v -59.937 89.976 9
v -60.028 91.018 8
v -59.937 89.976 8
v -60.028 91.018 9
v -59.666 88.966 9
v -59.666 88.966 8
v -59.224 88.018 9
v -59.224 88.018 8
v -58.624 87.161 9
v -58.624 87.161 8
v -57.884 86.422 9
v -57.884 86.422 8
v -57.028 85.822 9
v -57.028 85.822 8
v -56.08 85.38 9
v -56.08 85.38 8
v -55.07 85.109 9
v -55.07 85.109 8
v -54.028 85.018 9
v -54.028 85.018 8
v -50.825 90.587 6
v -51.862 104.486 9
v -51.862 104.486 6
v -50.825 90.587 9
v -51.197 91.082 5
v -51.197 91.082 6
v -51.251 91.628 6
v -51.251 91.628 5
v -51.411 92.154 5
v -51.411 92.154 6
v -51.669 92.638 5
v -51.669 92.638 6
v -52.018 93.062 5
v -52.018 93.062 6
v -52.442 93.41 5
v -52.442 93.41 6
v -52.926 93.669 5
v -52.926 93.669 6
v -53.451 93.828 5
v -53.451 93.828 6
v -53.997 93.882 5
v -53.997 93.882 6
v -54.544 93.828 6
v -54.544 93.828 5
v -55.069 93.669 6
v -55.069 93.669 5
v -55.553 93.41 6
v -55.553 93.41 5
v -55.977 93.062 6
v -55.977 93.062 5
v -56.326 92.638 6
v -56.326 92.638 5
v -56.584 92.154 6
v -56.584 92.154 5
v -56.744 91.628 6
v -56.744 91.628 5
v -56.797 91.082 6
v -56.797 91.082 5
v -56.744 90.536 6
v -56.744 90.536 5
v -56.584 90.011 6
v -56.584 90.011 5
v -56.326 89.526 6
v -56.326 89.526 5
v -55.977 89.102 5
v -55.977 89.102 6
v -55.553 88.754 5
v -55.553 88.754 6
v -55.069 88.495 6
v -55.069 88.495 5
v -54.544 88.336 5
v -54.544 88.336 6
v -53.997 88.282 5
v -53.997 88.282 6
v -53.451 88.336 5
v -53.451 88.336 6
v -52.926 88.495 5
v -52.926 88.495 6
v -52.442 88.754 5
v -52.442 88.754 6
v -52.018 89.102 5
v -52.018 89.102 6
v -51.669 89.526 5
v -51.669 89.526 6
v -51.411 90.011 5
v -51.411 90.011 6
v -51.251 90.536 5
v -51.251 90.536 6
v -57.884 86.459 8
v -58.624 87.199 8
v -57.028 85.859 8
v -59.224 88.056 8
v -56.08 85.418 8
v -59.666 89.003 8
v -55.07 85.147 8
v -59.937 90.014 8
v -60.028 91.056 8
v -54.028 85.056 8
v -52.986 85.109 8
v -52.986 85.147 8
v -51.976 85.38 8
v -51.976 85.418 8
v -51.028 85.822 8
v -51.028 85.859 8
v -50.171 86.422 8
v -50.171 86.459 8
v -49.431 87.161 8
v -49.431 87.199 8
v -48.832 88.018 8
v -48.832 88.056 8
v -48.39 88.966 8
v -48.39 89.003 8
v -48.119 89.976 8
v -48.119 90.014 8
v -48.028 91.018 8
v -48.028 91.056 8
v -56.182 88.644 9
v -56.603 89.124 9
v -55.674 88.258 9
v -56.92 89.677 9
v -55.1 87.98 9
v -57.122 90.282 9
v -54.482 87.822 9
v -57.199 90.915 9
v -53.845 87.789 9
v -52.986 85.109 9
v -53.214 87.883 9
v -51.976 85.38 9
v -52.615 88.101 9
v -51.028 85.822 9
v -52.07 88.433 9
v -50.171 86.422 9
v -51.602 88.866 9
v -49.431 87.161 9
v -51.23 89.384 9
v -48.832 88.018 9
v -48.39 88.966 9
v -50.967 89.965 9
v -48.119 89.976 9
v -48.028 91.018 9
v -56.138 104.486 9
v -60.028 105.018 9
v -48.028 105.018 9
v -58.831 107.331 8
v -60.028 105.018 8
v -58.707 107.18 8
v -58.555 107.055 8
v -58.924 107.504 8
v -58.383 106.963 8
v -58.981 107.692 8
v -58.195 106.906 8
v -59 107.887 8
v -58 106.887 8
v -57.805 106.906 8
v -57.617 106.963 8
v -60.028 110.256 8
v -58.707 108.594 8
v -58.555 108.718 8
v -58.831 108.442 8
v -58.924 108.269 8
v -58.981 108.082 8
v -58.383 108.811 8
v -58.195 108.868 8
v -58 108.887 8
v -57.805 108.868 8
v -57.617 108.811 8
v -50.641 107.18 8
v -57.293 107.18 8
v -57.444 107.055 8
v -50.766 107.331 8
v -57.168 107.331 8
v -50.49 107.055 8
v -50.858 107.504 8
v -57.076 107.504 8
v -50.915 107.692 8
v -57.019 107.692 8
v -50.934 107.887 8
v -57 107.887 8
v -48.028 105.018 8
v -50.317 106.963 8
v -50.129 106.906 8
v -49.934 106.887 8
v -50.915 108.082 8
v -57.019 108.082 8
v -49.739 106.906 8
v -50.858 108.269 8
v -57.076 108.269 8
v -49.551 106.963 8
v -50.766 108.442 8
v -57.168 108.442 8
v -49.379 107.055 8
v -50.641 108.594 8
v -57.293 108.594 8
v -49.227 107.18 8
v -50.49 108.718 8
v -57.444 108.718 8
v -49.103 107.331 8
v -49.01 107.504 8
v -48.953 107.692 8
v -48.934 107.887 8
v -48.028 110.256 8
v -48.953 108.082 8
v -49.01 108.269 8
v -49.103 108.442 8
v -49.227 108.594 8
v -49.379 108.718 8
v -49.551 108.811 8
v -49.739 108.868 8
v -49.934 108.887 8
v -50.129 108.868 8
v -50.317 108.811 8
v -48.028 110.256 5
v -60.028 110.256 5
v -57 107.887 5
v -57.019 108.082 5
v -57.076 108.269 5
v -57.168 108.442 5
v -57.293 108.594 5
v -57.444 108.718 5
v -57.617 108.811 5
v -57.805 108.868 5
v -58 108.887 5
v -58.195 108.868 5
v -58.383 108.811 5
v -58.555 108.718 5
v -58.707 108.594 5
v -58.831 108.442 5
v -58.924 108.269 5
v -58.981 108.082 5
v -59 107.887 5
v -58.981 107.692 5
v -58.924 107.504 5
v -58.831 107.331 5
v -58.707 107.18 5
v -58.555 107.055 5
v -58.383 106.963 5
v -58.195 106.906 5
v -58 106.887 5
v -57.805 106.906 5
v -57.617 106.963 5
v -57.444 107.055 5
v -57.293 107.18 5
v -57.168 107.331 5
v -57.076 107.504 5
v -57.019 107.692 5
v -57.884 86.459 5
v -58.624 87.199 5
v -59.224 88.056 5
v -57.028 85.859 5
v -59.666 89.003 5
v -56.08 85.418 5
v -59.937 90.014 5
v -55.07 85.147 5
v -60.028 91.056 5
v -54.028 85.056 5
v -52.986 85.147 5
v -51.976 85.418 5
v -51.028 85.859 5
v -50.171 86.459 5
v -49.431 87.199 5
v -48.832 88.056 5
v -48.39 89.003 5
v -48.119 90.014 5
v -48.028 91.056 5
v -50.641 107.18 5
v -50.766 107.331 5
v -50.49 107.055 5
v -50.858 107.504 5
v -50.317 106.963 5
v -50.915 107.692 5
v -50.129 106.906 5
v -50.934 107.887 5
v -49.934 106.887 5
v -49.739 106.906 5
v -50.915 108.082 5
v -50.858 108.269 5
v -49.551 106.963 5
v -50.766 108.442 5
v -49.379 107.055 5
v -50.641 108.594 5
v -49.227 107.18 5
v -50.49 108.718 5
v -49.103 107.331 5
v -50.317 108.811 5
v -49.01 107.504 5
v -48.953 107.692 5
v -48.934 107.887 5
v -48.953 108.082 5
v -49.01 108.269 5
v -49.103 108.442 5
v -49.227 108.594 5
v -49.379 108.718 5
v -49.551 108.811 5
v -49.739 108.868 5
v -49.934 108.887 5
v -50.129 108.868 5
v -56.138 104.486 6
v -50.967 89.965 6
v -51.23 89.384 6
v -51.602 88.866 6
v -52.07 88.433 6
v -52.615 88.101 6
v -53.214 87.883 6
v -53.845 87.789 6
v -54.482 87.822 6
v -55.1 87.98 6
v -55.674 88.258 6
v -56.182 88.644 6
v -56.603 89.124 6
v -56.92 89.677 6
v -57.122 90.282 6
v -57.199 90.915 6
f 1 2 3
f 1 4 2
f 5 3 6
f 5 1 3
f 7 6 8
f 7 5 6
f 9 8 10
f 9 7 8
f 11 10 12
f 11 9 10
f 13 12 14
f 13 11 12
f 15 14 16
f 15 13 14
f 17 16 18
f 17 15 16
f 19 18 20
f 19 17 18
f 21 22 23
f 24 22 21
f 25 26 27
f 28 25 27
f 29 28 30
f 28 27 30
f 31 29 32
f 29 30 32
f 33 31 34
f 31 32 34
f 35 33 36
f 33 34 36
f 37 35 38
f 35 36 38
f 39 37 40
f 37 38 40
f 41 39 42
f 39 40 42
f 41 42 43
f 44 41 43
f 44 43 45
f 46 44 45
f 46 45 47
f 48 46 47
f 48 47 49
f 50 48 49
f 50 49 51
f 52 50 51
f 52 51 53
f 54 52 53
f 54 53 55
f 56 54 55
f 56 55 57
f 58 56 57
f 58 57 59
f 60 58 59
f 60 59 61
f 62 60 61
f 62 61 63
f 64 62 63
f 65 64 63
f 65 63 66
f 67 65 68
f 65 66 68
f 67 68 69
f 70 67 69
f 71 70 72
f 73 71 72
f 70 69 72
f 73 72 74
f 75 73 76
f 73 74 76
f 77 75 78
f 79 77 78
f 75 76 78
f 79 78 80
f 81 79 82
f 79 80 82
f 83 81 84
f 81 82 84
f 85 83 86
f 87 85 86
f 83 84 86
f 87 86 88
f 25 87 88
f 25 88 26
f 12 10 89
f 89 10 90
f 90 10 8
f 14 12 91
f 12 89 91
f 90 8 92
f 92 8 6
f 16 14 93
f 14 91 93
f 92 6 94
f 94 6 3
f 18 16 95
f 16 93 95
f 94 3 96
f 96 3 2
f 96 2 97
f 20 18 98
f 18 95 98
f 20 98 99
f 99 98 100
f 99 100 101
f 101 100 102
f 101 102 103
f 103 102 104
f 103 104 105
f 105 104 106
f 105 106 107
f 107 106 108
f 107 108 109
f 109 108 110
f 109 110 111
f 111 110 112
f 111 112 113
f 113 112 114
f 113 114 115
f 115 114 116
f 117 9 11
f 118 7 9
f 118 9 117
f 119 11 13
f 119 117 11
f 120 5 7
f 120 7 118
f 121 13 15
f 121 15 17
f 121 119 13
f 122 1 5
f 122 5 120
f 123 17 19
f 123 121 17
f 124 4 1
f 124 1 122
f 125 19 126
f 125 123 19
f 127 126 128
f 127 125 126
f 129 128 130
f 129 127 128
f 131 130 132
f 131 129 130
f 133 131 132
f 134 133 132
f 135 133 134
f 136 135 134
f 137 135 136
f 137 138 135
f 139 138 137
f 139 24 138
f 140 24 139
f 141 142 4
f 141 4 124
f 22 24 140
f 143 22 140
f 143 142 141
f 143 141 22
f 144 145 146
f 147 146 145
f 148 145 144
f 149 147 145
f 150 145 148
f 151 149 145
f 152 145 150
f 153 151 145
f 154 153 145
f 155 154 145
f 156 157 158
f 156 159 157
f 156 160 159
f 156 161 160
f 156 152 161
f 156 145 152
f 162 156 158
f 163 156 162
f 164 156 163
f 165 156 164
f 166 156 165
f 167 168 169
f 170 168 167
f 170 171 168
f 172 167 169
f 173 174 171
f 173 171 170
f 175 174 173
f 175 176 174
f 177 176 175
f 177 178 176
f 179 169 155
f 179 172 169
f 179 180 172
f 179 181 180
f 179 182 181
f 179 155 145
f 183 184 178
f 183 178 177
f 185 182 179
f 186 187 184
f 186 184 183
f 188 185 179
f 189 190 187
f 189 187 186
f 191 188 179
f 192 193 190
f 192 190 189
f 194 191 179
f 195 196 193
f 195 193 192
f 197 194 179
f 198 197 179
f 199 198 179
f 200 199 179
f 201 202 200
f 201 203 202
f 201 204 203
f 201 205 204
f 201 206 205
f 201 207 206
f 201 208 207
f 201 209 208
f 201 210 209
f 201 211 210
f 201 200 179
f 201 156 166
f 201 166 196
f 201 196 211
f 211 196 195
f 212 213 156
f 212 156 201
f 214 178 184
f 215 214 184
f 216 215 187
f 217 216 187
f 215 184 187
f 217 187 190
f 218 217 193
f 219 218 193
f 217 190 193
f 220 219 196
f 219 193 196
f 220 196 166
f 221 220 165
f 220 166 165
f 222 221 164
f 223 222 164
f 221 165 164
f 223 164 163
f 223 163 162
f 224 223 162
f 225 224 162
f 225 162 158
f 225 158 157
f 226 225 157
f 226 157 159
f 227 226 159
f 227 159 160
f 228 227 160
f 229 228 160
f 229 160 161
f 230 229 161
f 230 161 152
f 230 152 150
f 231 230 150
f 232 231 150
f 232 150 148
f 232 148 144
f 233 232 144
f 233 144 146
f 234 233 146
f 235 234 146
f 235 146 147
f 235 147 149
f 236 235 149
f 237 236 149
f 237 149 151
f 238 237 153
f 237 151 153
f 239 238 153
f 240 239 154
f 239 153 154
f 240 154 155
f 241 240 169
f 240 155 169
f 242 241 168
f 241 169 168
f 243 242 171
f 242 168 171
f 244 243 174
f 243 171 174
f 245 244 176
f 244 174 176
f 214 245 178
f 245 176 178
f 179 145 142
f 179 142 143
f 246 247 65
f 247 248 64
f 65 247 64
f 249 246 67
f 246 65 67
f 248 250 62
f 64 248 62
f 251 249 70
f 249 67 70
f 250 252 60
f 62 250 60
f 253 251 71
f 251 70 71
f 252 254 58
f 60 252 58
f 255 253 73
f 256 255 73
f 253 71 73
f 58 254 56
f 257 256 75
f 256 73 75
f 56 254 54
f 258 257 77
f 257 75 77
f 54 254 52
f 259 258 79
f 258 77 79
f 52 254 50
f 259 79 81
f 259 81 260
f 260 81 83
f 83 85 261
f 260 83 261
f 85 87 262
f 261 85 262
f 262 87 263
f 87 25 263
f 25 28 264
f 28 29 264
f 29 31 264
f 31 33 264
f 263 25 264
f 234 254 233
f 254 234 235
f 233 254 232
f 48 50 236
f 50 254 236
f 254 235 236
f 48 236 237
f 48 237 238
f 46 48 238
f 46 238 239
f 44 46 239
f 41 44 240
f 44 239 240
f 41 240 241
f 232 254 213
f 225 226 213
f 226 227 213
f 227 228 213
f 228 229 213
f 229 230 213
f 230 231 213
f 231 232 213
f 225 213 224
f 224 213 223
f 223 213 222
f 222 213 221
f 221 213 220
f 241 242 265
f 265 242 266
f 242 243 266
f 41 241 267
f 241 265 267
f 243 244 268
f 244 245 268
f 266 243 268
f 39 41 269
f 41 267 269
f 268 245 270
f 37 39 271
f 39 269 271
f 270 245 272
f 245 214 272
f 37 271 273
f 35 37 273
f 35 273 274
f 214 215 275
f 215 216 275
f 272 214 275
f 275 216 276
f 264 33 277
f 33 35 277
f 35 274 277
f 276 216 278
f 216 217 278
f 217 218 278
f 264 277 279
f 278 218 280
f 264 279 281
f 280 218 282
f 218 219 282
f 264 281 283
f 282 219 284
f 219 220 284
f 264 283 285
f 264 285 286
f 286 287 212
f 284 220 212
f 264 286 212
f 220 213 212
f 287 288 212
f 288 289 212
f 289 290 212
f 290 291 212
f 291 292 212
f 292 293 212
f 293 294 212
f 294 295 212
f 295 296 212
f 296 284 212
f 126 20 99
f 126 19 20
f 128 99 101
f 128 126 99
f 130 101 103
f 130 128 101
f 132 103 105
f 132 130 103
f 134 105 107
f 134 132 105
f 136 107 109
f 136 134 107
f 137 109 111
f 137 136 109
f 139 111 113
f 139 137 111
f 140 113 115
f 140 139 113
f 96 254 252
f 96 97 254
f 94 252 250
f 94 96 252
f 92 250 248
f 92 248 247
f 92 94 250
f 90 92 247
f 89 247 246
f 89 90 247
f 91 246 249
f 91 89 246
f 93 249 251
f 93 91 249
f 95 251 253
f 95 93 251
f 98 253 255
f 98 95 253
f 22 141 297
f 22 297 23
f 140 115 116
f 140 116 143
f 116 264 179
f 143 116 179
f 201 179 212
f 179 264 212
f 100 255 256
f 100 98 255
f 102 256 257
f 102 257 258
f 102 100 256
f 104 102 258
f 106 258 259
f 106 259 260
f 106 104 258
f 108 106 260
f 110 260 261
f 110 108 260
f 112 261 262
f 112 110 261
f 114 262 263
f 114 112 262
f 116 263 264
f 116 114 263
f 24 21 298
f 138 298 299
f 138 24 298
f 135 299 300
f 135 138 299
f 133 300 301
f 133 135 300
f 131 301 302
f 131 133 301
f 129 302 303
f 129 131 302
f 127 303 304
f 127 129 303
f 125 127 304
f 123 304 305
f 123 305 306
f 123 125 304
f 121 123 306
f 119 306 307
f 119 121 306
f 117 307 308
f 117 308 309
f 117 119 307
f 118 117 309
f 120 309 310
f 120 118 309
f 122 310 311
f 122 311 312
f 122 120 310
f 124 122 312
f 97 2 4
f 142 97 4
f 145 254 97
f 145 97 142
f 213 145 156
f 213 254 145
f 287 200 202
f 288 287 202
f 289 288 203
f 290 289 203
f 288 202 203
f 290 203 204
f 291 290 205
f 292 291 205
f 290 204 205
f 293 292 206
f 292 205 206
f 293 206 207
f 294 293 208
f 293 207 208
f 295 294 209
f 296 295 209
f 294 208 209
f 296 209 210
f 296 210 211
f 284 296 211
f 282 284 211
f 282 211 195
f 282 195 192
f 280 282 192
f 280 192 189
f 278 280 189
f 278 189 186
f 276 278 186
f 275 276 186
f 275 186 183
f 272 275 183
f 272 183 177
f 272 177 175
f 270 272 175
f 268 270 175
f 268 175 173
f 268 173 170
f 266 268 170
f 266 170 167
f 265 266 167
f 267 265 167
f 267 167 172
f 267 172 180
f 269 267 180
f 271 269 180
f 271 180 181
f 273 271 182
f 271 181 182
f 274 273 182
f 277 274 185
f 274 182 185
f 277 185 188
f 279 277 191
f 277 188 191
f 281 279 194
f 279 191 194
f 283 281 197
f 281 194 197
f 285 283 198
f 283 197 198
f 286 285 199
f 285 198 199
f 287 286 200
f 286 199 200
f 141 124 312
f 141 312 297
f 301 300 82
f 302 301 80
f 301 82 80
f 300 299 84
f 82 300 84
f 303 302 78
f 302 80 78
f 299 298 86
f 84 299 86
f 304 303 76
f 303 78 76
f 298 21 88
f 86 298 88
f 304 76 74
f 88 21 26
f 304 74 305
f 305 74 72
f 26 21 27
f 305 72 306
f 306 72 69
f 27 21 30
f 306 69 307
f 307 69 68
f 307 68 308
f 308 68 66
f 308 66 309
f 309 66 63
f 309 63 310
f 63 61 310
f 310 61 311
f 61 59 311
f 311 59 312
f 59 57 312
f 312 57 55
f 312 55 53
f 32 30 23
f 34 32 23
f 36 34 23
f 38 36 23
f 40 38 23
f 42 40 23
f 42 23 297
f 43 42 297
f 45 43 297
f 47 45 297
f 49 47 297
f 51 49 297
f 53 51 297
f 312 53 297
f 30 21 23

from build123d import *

# Parameters (mm, degrees)
SKETCH1_W           = 12
SKETCH1_H           = 25.2
BOSS_EXTRUDE1_DEPTH = 3
FILLET1_R           = 6
SKETCH3_W           = 12
SKETCH3_H           = 20
BOSS_EXTRUDE2_DEPTH = 1
FILLET2_R           = 6
CUT_EXTRUDE1_DEPTH  = 3
SKETCH5_R           = 2.8
CUT_EXTRUDE2_DEPTH  = 126.573231257
SKETCH6_R           = 1
CUT_EXTRUDE3_DEPTH  = 126.573231257


with BuildPart() as part:
    # Sketch1 → Boss-Extrude1 (new body)
    with BuildSketch(Plane.XY.offset(5)):
        with Locations((-54.027704131, 97.655662644)):
            Rectangle(SKETCH1_W, SKETCH1_H)
    extrude(amount=BOSS_EXTRUDE1_DEPTH)

    # Fillet1
    fillet1_edges = [part.edges().sort_by_distance(p)[0] for p in [
        (-48.027704131, 85.055662644, 6.5),
        (-60.027704131, 85.055662644, 6.5),
    ]]
    fillet(fillet1_edges, radius=FILLET1_R - 0.0001)  # a hair under: the kernel refuses the full size

    # Sketch3 → Boss-Extrude2 (add)
    with BuildSketch(Plane.XY.offset(8)):
        with Locations((-54.027704131, 95.017998247)):
            Rectangle(SKETCH3_W, SKETCH3_H)
    extrude(amount=BOSS_EXTRUDE2_DEPTH)

    # Fillet2
    fillet2_edges = [part.edges().sort_by_distance(p)[0] for p in [
        (-48.027704131, 85.017998247, 8.5),
        (-60.027704131, 85.017998247, 8.5),
    ]]
    fillet(fillet2_edges, radius=FILLET2_R - 0.0001)  # a hair under: the kernel refuses the full size

    # Sketch4 → Cut-Extrude1 (cut, symmetric)
    with BuildSketch(Plane.XY.offset(9)):
        with BuildLine():
            Line((-56.13842392, 104.48600769), (-51.86157608, 104.48600769))
            Line((-51.86157608, 104.48600769), (-50.824897766, 90.586959839))
            ThreePointArc((-50.824897766, 90.586959839), (-54.164460237, 87.789583498), (-57.199226379, 90.914993286))
            Line((-57.199226379, 90.914993286), (-56.13842392, 104.48600769))
        make_face()
    extrude(amount=CUT_EXTRUDE1_DEPTH, both=True, mode=Mode.SUBTRACT)

    # Sketch5 → Cut-Extrude2 (cut, through all)
    with BuildSketch(Plane.XY.offset(6)):
        with Locations((-53.997448325, 91.08203191)):
            Circle(SKETCH5_R)
    extrude(amount=-CUT_EXTRUDE2_DEPTH, mode=Mode.SUBTRACT)

    # Sketch6 → Cut-Extrude3 (cut, through all)
    with BuildSketch(Plane.XY.offset(8)):
        with Locations((-57.999885247, 107.886757068)):
            Circle(SKETCH6_R)
        with Locations((-49.934118523, 107.886757068)):
            Circle(SKETCH6_R)
    extrude(amount=-CUT_EXTRUDE3_DEPTH, mode=Mode.SUBTRACT)


solid = part.part
